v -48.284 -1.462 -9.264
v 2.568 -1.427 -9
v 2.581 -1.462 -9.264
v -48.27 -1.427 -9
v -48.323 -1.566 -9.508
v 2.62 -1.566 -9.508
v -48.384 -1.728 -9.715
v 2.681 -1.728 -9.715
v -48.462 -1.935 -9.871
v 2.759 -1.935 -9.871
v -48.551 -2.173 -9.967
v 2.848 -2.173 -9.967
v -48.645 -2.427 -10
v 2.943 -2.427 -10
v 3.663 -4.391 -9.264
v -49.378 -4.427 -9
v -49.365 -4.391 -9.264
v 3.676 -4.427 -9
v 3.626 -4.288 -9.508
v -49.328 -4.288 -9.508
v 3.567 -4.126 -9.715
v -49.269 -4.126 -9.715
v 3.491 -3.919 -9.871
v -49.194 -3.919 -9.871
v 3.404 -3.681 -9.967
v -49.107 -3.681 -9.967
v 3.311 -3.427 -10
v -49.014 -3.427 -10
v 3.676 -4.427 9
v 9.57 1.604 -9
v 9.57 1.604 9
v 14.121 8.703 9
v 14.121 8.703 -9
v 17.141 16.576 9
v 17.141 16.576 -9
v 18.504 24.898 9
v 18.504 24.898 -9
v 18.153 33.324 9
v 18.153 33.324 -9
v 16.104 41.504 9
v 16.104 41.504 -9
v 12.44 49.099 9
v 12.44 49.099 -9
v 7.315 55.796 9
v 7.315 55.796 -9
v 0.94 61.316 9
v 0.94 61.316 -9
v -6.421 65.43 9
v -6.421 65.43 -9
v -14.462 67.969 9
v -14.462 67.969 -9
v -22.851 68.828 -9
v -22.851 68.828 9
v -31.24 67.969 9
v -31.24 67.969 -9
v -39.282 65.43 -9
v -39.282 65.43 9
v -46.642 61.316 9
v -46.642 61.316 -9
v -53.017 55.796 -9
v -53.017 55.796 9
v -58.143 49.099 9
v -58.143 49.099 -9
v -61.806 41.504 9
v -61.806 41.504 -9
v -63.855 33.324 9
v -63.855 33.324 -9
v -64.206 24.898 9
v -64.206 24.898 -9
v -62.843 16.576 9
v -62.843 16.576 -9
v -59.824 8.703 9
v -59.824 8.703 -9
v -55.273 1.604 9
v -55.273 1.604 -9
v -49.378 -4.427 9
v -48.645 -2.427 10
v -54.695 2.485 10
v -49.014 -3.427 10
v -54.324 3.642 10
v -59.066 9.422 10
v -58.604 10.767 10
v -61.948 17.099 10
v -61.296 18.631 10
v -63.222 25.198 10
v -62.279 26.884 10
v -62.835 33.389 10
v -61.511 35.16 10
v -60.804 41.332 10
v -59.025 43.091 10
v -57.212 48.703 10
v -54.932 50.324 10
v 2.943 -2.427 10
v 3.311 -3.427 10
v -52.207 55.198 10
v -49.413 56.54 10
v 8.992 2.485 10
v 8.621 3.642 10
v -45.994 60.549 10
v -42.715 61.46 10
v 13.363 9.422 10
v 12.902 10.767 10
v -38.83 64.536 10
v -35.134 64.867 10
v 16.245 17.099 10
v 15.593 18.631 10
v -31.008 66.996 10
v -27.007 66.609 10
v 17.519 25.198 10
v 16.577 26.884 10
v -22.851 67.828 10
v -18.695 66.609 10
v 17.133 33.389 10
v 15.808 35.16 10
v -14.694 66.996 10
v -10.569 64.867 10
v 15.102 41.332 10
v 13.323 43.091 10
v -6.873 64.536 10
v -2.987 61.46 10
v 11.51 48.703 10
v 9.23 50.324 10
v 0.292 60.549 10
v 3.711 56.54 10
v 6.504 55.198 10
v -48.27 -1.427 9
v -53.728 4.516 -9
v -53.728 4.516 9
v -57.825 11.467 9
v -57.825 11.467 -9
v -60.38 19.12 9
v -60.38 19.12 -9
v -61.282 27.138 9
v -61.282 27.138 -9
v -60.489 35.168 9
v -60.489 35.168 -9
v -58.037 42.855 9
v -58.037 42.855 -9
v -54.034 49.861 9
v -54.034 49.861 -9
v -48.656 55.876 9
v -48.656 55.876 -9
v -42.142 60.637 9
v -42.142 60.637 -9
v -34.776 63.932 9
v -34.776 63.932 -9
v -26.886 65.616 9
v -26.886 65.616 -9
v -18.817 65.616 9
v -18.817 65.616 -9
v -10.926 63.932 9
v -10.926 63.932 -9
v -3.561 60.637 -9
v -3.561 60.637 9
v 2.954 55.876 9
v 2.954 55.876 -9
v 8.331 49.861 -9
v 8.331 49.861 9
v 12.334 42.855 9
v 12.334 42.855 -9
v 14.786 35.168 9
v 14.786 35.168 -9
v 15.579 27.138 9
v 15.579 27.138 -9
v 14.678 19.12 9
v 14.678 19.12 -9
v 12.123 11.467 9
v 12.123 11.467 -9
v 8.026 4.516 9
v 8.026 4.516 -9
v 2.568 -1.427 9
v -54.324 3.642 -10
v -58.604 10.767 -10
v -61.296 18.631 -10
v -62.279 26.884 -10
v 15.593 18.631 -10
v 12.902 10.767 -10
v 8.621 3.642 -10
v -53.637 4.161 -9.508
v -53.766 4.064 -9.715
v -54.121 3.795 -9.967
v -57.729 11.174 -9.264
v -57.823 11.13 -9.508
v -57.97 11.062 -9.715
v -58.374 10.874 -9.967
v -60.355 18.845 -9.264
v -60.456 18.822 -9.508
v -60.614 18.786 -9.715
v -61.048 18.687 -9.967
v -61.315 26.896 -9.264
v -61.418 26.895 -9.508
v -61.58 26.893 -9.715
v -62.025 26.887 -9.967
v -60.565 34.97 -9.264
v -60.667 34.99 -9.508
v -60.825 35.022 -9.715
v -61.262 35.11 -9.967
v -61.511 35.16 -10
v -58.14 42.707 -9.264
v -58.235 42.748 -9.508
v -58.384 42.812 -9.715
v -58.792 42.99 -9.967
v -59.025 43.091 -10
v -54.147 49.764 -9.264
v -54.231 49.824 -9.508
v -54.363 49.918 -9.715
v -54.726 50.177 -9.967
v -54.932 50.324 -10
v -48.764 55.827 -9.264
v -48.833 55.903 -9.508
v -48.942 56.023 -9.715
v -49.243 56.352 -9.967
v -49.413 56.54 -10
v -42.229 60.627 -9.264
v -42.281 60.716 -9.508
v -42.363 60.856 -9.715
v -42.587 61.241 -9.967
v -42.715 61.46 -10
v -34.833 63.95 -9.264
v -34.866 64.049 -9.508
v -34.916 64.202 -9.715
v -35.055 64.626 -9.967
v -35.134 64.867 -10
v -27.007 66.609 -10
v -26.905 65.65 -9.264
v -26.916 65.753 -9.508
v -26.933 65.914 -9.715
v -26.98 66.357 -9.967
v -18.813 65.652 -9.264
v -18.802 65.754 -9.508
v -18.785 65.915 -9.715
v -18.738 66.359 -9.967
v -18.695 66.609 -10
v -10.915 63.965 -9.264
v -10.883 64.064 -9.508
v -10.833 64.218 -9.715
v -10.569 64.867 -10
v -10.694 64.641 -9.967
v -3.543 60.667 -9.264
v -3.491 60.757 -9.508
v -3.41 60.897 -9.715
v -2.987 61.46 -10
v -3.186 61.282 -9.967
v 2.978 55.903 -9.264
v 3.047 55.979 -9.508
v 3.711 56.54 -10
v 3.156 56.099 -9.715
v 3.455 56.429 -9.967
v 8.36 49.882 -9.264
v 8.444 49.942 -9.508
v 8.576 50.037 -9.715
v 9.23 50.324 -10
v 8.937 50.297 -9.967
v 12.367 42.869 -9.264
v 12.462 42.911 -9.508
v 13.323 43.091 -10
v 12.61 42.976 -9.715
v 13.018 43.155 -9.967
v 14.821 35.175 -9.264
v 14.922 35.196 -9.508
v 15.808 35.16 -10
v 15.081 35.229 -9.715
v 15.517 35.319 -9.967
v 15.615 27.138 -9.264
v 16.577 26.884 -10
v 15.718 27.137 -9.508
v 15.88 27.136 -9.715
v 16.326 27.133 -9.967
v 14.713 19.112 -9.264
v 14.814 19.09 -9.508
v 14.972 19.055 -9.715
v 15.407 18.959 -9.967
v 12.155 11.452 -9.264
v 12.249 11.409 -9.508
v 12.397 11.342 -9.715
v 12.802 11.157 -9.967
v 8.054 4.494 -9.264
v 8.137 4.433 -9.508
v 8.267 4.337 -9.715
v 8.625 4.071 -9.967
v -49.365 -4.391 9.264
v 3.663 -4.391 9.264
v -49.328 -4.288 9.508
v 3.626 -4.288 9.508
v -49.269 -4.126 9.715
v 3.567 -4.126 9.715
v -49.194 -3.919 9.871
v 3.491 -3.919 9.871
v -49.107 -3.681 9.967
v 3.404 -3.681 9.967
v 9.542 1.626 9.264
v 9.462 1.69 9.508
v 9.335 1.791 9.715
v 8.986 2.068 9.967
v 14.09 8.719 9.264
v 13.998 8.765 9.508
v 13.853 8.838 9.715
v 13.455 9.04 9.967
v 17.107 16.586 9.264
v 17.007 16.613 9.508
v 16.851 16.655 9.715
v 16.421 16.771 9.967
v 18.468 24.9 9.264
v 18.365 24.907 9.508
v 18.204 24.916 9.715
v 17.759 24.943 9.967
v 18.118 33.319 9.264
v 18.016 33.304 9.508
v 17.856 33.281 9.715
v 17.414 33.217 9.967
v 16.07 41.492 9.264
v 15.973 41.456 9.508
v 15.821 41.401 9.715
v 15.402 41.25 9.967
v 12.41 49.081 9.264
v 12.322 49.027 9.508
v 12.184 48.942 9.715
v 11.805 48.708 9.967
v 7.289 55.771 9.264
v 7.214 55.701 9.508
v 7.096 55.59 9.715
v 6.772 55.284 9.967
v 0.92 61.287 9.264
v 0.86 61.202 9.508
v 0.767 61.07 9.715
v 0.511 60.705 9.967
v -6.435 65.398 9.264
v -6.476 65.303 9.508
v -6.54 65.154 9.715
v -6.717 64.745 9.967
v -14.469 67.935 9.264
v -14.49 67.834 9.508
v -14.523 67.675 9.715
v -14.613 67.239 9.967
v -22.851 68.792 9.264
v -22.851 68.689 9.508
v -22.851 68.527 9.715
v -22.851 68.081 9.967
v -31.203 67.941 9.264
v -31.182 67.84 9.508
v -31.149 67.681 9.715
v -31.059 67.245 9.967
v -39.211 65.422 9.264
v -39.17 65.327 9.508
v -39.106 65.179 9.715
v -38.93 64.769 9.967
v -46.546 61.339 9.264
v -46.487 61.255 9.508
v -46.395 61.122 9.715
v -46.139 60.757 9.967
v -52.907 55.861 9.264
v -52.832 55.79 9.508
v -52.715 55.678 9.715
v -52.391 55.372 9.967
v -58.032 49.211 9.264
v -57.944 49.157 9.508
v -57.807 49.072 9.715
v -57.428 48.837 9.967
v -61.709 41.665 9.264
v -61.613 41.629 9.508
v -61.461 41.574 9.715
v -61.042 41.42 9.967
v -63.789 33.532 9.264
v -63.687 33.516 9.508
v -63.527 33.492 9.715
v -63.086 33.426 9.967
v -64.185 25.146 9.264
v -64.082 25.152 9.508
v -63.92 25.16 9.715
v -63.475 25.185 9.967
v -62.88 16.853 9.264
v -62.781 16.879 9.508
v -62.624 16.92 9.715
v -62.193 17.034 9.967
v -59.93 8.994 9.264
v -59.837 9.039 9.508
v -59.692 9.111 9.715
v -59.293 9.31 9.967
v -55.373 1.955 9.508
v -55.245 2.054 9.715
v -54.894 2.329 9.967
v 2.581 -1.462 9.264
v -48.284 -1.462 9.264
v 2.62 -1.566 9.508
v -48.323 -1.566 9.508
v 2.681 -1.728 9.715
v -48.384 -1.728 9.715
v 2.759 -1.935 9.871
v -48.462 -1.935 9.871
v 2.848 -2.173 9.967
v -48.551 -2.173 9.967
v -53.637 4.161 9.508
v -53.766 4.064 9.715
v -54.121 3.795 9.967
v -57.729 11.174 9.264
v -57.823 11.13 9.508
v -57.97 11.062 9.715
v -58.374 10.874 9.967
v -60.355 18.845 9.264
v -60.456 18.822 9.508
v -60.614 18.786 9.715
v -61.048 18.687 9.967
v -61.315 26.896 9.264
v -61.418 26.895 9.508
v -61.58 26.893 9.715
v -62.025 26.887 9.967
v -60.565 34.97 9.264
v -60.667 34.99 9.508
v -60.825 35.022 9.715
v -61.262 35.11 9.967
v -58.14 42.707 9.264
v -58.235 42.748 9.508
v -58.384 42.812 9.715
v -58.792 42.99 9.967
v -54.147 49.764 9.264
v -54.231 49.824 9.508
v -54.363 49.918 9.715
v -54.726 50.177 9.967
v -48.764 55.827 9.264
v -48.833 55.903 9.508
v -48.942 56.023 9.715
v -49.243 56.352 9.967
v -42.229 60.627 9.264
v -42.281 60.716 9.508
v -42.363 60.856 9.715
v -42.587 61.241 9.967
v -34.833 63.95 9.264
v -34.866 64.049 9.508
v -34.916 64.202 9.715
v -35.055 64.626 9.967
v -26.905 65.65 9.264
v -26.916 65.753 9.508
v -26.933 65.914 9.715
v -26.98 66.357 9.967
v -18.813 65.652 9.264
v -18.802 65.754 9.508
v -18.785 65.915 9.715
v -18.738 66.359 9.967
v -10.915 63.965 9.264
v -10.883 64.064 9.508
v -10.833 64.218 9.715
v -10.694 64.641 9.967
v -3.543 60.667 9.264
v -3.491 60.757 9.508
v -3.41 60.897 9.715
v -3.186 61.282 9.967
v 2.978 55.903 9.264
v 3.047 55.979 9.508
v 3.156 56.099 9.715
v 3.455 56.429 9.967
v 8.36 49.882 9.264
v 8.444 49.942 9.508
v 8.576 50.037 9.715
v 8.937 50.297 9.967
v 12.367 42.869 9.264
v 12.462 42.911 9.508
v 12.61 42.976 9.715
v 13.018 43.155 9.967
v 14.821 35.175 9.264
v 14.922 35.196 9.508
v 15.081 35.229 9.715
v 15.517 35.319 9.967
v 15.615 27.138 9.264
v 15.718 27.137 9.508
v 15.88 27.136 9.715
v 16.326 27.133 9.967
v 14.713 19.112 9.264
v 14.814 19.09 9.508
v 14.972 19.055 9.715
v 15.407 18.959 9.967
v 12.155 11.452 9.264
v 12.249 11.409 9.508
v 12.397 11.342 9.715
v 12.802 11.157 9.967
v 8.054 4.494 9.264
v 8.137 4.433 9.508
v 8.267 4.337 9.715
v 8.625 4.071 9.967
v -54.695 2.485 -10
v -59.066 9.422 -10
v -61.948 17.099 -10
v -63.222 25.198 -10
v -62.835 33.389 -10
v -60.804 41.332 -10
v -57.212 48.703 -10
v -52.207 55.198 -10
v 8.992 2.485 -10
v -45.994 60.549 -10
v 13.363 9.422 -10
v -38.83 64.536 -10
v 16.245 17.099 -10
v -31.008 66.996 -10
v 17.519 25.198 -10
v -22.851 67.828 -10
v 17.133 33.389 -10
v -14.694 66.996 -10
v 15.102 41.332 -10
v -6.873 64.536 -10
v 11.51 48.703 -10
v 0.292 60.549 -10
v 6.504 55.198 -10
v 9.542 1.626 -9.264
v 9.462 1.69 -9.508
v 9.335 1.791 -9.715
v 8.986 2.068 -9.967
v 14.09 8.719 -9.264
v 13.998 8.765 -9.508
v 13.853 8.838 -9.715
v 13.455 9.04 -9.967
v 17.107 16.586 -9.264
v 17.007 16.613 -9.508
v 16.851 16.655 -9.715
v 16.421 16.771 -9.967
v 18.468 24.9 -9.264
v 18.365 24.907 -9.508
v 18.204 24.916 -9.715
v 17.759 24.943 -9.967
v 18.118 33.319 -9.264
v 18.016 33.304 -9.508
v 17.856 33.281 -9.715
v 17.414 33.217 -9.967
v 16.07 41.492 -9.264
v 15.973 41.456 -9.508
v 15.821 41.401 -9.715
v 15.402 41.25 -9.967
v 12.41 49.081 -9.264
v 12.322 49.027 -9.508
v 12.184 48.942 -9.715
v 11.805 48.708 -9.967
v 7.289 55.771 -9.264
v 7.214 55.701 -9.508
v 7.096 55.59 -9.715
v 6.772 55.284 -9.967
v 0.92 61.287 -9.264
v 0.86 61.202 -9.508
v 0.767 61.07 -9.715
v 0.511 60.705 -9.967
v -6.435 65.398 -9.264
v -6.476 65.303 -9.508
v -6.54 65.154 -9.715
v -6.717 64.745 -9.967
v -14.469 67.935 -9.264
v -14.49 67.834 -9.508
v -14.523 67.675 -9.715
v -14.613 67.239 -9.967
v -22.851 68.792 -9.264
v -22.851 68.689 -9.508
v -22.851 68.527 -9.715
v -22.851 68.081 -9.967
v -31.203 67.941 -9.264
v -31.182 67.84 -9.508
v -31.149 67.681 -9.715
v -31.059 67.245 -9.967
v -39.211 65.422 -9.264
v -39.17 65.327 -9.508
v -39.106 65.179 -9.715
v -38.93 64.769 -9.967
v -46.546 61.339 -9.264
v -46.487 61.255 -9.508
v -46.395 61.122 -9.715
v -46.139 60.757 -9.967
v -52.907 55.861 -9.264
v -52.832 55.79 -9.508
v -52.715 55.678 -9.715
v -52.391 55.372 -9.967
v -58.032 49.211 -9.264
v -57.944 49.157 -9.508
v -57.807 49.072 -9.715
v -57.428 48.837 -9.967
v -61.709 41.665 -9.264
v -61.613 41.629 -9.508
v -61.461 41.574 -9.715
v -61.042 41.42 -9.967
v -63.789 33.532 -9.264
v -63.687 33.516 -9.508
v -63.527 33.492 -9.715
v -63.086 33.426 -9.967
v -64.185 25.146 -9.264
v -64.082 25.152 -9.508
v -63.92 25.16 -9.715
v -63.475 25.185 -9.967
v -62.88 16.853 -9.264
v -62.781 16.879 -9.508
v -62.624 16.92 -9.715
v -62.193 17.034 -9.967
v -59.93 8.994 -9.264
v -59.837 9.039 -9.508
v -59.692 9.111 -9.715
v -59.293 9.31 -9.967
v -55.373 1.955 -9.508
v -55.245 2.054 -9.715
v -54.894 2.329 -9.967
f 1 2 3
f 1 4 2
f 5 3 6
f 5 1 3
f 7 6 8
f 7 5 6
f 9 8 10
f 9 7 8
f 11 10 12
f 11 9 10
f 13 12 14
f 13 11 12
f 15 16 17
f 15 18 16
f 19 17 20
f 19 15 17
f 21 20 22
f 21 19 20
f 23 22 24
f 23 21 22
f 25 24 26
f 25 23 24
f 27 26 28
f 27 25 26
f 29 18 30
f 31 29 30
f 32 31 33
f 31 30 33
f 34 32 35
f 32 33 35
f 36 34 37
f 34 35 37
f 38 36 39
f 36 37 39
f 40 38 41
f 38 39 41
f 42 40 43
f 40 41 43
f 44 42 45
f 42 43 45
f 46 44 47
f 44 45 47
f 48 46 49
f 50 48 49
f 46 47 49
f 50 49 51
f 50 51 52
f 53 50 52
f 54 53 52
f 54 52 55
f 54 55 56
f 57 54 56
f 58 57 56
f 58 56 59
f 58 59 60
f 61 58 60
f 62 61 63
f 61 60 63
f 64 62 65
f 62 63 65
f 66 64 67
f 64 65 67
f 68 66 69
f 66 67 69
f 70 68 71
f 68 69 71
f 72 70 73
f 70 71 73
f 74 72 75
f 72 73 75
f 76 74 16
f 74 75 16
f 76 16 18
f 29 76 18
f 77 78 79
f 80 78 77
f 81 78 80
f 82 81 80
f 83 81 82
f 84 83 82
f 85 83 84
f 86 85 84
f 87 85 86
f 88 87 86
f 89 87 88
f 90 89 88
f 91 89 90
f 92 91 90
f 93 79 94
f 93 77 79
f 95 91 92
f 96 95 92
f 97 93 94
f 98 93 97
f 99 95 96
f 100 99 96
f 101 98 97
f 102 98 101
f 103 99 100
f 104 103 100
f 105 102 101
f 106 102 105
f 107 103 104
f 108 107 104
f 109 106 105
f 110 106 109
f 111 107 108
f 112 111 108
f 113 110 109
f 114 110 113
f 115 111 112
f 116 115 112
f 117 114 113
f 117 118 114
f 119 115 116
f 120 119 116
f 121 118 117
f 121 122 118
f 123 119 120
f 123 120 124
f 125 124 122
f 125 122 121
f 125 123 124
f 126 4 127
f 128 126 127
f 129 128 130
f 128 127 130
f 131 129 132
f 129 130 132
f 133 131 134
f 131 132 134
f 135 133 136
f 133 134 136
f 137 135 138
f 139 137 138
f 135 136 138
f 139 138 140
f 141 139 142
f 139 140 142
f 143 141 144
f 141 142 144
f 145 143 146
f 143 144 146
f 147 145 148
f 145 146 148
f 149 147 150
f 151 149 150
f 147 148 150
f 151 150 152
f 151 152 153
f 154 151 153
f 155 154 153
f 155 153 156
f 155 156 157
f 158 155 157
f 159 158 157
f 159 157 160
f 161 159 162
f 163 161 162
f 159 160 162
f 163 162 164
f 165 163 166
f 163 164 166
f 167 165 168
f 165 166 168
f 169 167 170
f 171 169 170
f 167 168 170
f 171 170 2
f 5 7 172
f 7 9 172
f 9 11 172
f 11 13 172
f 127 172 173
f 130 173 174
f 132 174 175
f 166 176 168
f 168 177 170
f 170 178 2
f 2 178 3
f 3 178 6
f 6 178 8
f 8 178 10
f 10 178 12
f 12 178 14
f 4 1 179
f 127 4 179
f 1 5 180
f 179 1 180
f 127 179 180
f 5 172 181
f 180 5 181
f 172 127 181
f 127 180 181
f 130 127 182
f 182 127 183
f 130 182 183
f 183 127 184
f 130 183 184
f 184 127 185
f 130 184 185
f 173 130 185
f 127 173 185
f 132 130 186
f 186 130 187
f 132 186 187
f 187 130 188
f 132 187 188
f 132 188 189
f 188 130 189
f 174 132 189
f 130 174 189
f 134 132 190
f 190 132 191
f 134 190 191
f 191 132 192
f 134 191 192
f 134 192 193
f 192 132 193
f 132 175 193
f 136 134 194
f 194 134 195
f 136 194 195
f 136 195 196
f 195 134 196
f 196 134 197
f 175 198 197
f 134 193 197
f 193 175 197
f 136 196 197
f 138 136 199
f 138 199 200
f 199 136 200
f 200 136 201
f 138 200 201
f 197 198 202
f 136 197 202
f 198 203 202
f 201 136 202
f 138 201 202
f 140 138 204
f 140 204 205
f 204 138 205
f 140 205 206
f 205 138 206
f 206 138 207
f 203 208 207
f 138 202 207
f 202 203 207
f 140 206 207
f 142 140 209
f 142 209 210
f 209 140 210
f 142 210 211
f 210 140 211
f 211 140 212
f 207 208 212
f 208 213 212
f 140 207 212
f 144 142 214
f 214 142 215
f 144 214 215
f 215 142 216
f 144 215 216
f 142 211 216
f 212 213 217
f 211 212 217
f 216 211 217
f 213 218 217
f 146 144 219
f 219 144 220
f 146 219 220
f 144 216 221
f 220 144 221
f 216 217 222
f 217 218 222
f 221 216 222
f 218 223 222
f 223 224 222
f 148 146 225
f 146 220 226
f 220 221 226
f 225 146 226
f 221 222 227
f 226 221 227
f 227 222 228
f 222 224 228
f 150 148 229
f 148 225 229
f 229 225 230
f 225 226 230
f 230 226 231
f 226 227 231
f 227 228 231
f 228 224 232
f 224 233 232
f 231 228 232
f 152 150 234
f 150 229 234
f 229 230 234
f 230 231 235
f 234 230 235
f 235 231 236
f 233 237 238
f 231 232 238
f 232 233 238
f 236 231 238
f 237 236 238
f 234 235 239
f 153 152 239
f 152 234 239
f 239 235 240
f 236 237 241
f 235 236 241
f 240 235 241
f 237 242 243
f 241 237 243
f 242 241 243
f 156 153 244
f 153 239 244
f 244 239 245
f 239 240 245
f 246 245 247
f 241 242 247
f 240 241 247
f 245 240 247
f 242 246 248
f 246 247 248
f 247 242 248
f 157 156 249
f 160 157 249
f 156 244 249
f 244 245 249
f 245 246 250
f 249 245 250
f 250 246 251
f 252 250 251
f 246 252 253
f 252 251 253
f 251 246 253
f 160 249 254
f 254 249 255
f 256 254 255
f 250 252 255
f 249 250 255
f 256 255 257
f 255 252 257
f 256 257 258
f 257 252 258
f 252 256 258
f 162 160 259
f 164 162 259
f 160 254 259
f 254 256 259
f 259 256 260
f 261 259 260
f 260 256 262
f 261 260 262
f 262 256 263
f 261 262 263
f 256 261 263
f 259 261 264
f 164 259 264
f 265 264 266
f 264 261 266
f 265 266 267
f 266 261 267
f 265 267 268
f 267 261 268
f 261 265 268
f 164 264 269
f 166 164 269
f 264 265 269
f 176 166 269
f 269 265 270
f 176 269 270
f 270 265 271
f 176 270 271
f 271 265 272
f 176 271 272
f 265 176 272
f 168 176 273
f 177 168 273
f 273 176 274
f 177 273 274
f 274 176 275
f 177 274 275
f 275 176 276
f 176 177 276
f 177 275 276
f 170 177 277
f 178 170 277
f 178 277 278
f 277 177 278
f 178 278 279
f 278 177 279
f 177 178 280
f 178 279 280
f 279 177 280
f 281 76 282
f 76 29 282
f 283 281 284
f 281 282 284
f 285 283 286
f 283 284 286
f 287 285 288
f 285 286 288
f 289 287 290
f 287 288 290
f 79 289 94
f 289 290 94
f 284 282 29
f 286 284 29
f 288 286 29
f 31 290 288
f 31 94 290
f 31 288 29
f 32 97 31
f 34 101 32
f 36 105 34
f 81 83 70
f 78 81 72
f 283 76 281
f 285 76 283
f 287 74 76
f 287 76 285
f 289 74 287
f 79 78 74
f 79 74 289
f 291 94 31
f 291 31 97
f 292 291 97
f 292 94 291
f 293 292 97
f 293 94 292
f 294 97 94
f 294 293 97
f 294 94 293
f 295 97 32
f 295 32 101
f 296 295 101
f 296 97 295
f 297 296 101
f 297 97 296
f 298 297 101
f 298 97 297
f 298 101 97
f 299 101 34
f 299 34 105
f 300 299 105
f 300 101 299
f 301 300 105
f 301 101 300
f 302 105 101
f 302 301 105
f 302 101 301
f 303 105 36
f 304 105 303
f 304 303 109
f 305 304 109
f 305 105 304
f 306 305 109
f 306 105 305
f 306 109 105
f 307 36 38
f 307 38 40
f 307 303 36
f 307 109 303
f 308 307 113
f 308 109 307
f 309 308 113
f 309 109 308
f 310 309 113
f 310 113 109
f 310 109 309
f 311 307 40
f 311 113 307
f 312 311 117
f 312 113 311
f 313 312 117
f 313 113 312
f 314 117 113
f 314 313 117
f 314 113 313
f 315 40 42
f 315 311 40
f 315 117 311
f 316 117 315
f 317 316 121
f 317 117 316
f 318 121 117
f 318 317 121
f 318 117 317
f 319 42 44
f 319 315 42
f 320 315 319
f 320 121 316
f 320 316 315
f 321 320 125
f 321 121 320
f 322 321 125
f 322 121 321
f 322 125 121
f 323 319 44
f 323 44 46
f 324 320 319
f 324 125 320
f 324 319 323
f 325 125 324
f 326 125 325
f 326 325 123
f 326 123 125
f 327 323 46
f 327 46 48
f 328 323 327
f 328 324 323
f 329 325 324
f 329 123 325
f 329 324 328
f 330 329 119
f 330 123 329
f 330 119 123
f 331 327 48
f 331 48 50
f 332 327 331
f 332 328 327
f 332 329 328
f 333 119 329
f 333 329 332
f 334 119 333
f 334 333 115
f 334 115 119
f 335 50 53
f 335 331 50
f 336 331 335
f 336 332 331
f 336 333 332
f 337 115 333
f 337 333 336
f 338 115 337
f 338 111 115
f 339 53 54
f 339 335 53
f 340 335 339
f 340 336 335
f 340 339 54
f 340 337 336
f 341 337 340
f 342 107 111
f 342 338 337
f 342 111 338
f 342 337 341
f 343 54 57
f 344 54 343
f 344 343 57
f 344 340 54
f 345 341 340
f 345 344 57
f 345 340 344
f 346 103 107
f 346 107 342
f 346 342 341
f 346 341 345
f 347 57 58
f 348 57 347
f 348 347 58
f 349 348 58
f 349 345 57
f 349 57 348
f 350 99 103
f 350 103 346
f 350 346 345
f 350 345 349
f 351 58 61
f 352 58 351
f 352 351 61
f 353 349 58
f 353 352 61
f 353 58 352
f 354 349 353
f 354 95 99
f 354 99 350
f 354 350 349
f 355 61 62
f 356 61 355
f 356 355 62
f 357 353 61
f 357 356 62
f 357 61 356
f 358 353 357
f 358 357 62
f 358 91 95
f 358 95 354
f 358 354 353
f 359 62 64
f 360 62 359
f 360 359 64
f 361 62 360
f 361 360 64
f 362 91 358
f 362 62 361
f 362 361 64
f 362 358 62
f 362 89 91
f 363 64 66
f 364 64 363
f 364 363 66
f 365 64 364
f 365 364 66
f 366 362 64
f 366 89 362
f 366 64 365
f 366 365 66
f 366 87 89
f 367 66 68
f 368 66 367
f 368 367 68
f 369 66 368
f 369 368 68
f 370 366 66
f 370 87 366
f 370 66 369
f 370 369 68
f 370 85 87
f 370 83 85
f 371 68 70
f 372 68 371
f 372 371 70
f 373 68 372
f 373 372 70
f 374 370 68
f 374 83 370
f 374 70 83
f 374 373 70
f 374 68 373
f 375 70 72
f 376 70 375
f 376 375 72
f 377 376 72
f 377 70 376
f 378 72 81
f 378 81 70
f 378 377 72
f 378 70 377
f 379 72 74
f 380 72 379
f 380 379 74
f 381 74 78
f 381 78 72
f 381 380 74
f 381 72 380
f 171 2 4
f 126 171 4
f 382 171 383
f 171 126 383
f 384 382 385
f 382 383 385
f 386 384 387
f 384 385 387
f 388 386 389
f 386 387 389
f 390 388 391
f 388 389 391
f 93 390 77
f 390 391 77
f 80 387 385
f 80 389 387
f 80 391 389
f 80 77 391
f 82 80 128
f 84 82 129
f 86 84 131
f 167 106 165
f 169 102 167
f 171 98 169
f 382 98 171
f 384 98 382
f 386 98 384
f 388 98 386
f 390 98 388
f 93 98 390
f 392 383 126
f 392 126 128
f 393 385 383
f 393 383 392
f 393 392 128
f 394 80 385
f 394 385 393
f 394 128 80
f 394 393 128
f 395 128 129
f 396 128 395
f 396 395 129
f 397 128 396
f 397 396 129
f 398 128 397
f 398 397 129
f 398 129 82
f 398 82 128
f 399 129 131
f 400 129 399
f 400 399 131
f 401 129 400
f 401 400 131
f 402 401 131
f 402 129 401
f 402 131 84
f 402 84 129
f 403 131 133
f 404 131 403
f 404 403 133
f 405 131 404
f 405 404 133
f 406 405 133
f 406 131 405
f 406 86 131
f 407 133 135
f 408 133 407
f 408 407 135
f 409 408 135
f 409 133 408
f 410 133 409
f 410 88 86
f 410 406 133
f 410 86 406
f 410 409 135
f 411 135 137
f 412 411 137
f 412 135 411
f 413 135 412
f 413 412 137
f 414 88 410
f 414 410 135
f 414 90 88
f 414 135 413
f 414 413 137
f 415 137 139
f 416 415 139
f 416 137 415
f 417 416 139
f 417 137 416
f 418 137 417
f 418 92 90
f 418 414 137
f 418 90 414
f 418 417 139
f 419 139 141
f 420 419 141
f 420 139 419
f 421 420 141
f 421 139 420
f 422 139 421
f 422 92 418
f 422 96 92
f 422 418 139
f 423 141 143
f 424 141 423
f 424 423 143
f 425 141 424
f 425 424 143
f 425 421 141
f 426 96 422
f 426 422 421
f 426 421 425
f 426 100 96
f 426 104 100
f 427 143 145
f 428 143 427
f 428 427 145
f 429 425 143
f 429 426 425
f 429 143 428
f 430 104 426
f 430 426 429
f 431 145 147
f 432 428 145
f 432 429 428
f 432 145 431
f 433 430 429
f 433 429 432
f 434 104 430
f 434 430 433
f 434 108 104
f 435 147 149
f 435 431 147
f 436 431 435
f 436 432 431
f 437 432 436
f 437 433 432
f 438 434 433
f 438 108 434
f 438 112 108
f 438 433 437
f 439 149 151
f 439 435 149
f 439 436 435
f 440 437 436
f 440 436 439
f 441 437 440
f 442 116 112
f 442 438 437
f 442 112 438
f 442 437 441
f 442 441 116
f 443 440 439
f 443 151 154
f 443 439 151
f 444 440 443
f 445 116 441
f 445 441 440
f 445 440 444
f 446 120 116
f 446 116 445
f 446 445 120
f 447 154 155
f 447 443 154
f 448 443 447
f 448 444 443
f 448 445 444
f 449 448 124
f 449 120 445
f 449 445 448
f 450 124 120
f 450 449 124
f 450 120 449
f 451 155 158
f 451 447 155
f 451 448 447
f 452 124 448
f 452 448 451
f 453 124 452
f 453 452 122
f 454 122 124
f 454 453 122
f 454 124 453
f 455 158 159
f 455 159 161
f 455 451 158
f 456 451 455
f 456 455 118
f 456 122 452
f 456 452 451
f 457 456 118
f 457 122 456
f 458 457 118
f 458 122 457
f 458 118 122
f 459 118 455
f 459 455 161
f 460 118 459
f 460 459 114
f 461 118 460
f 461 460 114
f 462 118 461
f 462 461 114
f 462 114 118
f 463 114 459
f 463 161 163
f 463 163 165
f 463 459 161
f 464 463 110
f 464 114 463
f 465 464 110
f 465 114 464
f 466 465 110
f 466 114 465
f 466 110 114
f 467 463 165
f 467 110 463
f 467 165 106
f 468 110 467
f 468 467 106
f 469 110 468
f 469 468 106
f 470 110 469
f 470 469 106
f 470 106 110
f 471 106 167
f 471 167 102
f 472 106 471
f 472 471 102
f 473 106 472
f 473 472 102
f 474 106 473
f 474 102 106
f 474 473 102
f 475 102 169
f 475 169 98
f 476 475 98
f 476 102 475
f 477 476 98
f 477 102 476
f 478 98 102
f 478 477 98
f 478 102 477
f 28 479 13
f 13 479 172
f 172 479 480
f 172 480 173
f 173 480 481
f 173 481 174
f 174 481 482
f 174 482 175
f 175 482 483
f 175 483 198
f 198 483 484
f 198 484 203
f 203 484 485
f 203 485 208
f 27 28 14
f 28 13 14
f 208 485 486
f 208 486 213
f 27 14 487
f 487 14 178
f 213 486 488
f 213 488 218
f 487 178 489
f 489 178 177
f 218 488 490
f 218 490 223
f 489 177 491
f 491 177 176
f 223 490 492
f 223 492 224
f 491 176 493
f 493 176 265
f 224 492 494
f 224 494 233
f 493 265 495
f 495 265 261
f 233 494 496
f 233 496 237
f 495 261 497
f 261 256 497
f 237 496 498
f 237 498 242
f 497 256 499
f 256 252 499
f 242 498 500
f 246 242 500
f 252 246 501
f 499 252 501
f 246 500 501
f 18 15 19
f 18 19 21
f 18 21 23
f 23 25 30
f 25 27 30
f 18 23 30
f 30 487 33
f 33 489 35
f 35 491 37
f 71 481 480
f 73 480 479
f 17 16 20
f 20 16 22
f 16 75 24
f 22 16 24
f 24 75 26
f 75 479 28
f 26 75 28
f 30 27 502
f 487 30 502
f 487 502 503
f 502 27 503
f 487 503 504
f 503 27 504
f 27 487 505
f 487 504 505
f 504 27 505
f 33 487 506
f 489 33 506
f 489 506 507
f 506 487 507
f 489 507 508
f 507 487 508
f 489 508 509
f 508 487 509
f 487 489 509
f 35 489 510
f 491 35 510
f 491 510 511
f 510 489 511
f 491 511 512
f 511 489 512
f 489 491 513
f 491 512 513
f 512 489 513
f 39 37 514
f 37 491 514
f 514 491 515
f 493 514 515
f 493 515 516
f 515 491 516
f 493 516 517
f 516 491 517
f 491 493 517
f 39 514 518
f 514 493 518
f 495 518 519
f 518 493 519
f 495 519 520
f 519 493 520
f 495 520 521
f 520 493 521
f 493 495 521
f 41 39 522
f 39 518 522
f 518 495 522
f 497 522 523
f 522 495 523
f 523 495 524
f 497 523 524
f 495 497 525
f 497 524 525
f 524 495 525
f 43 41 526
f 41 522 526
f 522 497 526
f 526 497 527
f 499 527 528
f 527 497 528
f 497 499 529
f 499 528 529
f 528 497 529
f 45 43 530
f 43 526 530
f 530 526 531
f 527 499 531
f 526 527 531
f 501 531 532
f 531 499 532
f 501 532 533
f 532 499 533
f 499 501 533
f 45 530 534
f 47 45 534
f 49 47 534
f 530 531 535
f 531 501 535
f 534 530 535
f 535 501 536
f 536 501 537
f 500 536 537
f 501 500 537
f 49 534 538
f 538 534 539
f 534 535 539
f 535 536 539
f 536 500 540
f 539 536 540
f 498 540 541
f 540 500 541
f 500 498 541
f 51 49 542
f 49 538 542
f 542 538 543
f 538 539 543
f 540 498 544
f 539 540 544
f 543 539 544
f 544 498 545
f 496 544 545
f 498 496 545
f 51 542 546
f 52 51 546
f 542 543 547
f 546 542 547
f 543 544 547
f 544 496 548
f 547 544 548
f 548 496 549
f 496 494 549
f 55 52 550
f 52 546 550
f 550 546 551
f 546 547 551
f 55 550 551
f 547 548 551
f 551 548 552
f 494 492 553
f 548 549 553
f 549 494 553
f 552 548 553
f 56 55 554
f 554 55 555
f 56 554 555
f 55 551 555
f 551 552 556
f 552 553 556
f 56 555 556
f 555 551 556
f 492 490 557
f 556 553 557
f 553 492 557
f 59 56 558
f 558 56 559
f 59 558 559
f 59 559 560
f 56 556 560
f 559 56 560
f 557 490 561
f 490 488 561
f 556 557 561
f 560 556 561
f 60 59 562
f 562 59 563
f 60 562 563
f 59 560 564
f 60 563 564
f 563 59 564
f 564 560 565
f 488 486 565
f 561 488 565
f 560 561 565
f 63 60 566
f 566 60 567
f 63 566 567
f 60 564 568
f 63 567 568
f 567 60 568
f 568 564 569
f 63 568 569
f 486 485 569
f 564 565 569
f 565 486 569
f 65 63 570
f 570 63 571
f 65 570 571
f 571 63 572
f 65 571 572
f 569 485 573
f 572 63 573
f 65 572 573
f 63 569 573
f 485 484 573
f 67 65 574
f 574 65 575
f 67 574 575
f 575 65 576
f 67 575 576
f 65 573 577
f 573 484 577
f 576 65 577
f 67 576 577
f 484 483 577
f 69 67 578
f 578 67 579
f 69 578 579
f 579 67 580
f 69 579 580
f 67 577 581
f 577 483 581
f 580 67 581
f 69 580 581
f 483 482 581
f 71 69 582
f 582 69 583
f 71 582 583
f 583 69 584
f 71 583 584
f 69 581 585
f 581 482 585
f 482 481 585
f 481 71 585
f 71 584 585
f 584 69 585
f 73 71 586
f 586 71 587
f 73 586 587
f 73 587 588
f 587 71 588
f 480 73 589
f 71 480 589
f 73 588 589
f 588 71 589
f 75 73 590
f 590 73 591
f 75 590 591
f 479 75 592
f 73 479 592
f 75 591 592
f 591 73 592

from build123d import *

# Parameters (mm, degrees)
WYCI_GNI_CIE_START            = -10
WYCI_GNI_CIE_PO_CIE_CE1_DEPTH = 20
ZAOKR_GLENIE3_R               = 1


# Read off the part's stored shape, not the designer's step: Wyciągnięcie po ścieżce1
with BuildPart() as part:
    # Wyciągnięcie po ścieżce1 outline → Wyciągnięcie po ścieżce1 (new body)
    with BuildSketch(Plane.XY.offset(WYCI_GNI_CIE_START)):
        with BuildLine():
            Line((-49.378170185, -4.426863255), (3.675802301, -4.426863255))
            ThreePointArc((3.675802301, -4.426863255), (-22.851183942, 68.827583292), (-49.378170185, -4.426863255))
        make_face()
        with BuildLine():
            Line((2.567806336, -1.426863255), (-48.270174221, -1.426863255))
            ThreePointArc((-48.270174221, -1.426863255), (-22.851183943, 65.828623711), (2.567806336, -1.426863255))
        make_face(mode=Mode.SUBTRACT)
    extrude(amount=WYCI_GNI_CIE_PO_CIE_CE1_DEPTH)

    # Zaokrąglenie3
    zaokr_glenie3_edges = [part.edges().sort_by_distance(p)[0] for p in [
        (-22.851183942, -1.426863255, 10),
        (-22.851183942, -4.426863255, 10),
        (-22.851183942, -4.426863255, 10),
        (-22.851183942, -1.426863255, 10),
        (-22.851183942, -1.426863255, -10),
        (-22.851183942, -4.426863255, -10),
        (-22.851183942, -4.426863255, -10),
        (-22.851183942, -1.426863255, -10),
        (-22.851183942, 65.828623711, -10),
        (-22.851183942, 68.827583292, -10),
        (-22.851183942, 68.827583292, 10),
        (-22.851183942, 65.828623711, 10),
    ]]
    fillet(zaokr_glenie3_edges, radius=ZAOKR_GLENIE3_R)


solid = part.part
